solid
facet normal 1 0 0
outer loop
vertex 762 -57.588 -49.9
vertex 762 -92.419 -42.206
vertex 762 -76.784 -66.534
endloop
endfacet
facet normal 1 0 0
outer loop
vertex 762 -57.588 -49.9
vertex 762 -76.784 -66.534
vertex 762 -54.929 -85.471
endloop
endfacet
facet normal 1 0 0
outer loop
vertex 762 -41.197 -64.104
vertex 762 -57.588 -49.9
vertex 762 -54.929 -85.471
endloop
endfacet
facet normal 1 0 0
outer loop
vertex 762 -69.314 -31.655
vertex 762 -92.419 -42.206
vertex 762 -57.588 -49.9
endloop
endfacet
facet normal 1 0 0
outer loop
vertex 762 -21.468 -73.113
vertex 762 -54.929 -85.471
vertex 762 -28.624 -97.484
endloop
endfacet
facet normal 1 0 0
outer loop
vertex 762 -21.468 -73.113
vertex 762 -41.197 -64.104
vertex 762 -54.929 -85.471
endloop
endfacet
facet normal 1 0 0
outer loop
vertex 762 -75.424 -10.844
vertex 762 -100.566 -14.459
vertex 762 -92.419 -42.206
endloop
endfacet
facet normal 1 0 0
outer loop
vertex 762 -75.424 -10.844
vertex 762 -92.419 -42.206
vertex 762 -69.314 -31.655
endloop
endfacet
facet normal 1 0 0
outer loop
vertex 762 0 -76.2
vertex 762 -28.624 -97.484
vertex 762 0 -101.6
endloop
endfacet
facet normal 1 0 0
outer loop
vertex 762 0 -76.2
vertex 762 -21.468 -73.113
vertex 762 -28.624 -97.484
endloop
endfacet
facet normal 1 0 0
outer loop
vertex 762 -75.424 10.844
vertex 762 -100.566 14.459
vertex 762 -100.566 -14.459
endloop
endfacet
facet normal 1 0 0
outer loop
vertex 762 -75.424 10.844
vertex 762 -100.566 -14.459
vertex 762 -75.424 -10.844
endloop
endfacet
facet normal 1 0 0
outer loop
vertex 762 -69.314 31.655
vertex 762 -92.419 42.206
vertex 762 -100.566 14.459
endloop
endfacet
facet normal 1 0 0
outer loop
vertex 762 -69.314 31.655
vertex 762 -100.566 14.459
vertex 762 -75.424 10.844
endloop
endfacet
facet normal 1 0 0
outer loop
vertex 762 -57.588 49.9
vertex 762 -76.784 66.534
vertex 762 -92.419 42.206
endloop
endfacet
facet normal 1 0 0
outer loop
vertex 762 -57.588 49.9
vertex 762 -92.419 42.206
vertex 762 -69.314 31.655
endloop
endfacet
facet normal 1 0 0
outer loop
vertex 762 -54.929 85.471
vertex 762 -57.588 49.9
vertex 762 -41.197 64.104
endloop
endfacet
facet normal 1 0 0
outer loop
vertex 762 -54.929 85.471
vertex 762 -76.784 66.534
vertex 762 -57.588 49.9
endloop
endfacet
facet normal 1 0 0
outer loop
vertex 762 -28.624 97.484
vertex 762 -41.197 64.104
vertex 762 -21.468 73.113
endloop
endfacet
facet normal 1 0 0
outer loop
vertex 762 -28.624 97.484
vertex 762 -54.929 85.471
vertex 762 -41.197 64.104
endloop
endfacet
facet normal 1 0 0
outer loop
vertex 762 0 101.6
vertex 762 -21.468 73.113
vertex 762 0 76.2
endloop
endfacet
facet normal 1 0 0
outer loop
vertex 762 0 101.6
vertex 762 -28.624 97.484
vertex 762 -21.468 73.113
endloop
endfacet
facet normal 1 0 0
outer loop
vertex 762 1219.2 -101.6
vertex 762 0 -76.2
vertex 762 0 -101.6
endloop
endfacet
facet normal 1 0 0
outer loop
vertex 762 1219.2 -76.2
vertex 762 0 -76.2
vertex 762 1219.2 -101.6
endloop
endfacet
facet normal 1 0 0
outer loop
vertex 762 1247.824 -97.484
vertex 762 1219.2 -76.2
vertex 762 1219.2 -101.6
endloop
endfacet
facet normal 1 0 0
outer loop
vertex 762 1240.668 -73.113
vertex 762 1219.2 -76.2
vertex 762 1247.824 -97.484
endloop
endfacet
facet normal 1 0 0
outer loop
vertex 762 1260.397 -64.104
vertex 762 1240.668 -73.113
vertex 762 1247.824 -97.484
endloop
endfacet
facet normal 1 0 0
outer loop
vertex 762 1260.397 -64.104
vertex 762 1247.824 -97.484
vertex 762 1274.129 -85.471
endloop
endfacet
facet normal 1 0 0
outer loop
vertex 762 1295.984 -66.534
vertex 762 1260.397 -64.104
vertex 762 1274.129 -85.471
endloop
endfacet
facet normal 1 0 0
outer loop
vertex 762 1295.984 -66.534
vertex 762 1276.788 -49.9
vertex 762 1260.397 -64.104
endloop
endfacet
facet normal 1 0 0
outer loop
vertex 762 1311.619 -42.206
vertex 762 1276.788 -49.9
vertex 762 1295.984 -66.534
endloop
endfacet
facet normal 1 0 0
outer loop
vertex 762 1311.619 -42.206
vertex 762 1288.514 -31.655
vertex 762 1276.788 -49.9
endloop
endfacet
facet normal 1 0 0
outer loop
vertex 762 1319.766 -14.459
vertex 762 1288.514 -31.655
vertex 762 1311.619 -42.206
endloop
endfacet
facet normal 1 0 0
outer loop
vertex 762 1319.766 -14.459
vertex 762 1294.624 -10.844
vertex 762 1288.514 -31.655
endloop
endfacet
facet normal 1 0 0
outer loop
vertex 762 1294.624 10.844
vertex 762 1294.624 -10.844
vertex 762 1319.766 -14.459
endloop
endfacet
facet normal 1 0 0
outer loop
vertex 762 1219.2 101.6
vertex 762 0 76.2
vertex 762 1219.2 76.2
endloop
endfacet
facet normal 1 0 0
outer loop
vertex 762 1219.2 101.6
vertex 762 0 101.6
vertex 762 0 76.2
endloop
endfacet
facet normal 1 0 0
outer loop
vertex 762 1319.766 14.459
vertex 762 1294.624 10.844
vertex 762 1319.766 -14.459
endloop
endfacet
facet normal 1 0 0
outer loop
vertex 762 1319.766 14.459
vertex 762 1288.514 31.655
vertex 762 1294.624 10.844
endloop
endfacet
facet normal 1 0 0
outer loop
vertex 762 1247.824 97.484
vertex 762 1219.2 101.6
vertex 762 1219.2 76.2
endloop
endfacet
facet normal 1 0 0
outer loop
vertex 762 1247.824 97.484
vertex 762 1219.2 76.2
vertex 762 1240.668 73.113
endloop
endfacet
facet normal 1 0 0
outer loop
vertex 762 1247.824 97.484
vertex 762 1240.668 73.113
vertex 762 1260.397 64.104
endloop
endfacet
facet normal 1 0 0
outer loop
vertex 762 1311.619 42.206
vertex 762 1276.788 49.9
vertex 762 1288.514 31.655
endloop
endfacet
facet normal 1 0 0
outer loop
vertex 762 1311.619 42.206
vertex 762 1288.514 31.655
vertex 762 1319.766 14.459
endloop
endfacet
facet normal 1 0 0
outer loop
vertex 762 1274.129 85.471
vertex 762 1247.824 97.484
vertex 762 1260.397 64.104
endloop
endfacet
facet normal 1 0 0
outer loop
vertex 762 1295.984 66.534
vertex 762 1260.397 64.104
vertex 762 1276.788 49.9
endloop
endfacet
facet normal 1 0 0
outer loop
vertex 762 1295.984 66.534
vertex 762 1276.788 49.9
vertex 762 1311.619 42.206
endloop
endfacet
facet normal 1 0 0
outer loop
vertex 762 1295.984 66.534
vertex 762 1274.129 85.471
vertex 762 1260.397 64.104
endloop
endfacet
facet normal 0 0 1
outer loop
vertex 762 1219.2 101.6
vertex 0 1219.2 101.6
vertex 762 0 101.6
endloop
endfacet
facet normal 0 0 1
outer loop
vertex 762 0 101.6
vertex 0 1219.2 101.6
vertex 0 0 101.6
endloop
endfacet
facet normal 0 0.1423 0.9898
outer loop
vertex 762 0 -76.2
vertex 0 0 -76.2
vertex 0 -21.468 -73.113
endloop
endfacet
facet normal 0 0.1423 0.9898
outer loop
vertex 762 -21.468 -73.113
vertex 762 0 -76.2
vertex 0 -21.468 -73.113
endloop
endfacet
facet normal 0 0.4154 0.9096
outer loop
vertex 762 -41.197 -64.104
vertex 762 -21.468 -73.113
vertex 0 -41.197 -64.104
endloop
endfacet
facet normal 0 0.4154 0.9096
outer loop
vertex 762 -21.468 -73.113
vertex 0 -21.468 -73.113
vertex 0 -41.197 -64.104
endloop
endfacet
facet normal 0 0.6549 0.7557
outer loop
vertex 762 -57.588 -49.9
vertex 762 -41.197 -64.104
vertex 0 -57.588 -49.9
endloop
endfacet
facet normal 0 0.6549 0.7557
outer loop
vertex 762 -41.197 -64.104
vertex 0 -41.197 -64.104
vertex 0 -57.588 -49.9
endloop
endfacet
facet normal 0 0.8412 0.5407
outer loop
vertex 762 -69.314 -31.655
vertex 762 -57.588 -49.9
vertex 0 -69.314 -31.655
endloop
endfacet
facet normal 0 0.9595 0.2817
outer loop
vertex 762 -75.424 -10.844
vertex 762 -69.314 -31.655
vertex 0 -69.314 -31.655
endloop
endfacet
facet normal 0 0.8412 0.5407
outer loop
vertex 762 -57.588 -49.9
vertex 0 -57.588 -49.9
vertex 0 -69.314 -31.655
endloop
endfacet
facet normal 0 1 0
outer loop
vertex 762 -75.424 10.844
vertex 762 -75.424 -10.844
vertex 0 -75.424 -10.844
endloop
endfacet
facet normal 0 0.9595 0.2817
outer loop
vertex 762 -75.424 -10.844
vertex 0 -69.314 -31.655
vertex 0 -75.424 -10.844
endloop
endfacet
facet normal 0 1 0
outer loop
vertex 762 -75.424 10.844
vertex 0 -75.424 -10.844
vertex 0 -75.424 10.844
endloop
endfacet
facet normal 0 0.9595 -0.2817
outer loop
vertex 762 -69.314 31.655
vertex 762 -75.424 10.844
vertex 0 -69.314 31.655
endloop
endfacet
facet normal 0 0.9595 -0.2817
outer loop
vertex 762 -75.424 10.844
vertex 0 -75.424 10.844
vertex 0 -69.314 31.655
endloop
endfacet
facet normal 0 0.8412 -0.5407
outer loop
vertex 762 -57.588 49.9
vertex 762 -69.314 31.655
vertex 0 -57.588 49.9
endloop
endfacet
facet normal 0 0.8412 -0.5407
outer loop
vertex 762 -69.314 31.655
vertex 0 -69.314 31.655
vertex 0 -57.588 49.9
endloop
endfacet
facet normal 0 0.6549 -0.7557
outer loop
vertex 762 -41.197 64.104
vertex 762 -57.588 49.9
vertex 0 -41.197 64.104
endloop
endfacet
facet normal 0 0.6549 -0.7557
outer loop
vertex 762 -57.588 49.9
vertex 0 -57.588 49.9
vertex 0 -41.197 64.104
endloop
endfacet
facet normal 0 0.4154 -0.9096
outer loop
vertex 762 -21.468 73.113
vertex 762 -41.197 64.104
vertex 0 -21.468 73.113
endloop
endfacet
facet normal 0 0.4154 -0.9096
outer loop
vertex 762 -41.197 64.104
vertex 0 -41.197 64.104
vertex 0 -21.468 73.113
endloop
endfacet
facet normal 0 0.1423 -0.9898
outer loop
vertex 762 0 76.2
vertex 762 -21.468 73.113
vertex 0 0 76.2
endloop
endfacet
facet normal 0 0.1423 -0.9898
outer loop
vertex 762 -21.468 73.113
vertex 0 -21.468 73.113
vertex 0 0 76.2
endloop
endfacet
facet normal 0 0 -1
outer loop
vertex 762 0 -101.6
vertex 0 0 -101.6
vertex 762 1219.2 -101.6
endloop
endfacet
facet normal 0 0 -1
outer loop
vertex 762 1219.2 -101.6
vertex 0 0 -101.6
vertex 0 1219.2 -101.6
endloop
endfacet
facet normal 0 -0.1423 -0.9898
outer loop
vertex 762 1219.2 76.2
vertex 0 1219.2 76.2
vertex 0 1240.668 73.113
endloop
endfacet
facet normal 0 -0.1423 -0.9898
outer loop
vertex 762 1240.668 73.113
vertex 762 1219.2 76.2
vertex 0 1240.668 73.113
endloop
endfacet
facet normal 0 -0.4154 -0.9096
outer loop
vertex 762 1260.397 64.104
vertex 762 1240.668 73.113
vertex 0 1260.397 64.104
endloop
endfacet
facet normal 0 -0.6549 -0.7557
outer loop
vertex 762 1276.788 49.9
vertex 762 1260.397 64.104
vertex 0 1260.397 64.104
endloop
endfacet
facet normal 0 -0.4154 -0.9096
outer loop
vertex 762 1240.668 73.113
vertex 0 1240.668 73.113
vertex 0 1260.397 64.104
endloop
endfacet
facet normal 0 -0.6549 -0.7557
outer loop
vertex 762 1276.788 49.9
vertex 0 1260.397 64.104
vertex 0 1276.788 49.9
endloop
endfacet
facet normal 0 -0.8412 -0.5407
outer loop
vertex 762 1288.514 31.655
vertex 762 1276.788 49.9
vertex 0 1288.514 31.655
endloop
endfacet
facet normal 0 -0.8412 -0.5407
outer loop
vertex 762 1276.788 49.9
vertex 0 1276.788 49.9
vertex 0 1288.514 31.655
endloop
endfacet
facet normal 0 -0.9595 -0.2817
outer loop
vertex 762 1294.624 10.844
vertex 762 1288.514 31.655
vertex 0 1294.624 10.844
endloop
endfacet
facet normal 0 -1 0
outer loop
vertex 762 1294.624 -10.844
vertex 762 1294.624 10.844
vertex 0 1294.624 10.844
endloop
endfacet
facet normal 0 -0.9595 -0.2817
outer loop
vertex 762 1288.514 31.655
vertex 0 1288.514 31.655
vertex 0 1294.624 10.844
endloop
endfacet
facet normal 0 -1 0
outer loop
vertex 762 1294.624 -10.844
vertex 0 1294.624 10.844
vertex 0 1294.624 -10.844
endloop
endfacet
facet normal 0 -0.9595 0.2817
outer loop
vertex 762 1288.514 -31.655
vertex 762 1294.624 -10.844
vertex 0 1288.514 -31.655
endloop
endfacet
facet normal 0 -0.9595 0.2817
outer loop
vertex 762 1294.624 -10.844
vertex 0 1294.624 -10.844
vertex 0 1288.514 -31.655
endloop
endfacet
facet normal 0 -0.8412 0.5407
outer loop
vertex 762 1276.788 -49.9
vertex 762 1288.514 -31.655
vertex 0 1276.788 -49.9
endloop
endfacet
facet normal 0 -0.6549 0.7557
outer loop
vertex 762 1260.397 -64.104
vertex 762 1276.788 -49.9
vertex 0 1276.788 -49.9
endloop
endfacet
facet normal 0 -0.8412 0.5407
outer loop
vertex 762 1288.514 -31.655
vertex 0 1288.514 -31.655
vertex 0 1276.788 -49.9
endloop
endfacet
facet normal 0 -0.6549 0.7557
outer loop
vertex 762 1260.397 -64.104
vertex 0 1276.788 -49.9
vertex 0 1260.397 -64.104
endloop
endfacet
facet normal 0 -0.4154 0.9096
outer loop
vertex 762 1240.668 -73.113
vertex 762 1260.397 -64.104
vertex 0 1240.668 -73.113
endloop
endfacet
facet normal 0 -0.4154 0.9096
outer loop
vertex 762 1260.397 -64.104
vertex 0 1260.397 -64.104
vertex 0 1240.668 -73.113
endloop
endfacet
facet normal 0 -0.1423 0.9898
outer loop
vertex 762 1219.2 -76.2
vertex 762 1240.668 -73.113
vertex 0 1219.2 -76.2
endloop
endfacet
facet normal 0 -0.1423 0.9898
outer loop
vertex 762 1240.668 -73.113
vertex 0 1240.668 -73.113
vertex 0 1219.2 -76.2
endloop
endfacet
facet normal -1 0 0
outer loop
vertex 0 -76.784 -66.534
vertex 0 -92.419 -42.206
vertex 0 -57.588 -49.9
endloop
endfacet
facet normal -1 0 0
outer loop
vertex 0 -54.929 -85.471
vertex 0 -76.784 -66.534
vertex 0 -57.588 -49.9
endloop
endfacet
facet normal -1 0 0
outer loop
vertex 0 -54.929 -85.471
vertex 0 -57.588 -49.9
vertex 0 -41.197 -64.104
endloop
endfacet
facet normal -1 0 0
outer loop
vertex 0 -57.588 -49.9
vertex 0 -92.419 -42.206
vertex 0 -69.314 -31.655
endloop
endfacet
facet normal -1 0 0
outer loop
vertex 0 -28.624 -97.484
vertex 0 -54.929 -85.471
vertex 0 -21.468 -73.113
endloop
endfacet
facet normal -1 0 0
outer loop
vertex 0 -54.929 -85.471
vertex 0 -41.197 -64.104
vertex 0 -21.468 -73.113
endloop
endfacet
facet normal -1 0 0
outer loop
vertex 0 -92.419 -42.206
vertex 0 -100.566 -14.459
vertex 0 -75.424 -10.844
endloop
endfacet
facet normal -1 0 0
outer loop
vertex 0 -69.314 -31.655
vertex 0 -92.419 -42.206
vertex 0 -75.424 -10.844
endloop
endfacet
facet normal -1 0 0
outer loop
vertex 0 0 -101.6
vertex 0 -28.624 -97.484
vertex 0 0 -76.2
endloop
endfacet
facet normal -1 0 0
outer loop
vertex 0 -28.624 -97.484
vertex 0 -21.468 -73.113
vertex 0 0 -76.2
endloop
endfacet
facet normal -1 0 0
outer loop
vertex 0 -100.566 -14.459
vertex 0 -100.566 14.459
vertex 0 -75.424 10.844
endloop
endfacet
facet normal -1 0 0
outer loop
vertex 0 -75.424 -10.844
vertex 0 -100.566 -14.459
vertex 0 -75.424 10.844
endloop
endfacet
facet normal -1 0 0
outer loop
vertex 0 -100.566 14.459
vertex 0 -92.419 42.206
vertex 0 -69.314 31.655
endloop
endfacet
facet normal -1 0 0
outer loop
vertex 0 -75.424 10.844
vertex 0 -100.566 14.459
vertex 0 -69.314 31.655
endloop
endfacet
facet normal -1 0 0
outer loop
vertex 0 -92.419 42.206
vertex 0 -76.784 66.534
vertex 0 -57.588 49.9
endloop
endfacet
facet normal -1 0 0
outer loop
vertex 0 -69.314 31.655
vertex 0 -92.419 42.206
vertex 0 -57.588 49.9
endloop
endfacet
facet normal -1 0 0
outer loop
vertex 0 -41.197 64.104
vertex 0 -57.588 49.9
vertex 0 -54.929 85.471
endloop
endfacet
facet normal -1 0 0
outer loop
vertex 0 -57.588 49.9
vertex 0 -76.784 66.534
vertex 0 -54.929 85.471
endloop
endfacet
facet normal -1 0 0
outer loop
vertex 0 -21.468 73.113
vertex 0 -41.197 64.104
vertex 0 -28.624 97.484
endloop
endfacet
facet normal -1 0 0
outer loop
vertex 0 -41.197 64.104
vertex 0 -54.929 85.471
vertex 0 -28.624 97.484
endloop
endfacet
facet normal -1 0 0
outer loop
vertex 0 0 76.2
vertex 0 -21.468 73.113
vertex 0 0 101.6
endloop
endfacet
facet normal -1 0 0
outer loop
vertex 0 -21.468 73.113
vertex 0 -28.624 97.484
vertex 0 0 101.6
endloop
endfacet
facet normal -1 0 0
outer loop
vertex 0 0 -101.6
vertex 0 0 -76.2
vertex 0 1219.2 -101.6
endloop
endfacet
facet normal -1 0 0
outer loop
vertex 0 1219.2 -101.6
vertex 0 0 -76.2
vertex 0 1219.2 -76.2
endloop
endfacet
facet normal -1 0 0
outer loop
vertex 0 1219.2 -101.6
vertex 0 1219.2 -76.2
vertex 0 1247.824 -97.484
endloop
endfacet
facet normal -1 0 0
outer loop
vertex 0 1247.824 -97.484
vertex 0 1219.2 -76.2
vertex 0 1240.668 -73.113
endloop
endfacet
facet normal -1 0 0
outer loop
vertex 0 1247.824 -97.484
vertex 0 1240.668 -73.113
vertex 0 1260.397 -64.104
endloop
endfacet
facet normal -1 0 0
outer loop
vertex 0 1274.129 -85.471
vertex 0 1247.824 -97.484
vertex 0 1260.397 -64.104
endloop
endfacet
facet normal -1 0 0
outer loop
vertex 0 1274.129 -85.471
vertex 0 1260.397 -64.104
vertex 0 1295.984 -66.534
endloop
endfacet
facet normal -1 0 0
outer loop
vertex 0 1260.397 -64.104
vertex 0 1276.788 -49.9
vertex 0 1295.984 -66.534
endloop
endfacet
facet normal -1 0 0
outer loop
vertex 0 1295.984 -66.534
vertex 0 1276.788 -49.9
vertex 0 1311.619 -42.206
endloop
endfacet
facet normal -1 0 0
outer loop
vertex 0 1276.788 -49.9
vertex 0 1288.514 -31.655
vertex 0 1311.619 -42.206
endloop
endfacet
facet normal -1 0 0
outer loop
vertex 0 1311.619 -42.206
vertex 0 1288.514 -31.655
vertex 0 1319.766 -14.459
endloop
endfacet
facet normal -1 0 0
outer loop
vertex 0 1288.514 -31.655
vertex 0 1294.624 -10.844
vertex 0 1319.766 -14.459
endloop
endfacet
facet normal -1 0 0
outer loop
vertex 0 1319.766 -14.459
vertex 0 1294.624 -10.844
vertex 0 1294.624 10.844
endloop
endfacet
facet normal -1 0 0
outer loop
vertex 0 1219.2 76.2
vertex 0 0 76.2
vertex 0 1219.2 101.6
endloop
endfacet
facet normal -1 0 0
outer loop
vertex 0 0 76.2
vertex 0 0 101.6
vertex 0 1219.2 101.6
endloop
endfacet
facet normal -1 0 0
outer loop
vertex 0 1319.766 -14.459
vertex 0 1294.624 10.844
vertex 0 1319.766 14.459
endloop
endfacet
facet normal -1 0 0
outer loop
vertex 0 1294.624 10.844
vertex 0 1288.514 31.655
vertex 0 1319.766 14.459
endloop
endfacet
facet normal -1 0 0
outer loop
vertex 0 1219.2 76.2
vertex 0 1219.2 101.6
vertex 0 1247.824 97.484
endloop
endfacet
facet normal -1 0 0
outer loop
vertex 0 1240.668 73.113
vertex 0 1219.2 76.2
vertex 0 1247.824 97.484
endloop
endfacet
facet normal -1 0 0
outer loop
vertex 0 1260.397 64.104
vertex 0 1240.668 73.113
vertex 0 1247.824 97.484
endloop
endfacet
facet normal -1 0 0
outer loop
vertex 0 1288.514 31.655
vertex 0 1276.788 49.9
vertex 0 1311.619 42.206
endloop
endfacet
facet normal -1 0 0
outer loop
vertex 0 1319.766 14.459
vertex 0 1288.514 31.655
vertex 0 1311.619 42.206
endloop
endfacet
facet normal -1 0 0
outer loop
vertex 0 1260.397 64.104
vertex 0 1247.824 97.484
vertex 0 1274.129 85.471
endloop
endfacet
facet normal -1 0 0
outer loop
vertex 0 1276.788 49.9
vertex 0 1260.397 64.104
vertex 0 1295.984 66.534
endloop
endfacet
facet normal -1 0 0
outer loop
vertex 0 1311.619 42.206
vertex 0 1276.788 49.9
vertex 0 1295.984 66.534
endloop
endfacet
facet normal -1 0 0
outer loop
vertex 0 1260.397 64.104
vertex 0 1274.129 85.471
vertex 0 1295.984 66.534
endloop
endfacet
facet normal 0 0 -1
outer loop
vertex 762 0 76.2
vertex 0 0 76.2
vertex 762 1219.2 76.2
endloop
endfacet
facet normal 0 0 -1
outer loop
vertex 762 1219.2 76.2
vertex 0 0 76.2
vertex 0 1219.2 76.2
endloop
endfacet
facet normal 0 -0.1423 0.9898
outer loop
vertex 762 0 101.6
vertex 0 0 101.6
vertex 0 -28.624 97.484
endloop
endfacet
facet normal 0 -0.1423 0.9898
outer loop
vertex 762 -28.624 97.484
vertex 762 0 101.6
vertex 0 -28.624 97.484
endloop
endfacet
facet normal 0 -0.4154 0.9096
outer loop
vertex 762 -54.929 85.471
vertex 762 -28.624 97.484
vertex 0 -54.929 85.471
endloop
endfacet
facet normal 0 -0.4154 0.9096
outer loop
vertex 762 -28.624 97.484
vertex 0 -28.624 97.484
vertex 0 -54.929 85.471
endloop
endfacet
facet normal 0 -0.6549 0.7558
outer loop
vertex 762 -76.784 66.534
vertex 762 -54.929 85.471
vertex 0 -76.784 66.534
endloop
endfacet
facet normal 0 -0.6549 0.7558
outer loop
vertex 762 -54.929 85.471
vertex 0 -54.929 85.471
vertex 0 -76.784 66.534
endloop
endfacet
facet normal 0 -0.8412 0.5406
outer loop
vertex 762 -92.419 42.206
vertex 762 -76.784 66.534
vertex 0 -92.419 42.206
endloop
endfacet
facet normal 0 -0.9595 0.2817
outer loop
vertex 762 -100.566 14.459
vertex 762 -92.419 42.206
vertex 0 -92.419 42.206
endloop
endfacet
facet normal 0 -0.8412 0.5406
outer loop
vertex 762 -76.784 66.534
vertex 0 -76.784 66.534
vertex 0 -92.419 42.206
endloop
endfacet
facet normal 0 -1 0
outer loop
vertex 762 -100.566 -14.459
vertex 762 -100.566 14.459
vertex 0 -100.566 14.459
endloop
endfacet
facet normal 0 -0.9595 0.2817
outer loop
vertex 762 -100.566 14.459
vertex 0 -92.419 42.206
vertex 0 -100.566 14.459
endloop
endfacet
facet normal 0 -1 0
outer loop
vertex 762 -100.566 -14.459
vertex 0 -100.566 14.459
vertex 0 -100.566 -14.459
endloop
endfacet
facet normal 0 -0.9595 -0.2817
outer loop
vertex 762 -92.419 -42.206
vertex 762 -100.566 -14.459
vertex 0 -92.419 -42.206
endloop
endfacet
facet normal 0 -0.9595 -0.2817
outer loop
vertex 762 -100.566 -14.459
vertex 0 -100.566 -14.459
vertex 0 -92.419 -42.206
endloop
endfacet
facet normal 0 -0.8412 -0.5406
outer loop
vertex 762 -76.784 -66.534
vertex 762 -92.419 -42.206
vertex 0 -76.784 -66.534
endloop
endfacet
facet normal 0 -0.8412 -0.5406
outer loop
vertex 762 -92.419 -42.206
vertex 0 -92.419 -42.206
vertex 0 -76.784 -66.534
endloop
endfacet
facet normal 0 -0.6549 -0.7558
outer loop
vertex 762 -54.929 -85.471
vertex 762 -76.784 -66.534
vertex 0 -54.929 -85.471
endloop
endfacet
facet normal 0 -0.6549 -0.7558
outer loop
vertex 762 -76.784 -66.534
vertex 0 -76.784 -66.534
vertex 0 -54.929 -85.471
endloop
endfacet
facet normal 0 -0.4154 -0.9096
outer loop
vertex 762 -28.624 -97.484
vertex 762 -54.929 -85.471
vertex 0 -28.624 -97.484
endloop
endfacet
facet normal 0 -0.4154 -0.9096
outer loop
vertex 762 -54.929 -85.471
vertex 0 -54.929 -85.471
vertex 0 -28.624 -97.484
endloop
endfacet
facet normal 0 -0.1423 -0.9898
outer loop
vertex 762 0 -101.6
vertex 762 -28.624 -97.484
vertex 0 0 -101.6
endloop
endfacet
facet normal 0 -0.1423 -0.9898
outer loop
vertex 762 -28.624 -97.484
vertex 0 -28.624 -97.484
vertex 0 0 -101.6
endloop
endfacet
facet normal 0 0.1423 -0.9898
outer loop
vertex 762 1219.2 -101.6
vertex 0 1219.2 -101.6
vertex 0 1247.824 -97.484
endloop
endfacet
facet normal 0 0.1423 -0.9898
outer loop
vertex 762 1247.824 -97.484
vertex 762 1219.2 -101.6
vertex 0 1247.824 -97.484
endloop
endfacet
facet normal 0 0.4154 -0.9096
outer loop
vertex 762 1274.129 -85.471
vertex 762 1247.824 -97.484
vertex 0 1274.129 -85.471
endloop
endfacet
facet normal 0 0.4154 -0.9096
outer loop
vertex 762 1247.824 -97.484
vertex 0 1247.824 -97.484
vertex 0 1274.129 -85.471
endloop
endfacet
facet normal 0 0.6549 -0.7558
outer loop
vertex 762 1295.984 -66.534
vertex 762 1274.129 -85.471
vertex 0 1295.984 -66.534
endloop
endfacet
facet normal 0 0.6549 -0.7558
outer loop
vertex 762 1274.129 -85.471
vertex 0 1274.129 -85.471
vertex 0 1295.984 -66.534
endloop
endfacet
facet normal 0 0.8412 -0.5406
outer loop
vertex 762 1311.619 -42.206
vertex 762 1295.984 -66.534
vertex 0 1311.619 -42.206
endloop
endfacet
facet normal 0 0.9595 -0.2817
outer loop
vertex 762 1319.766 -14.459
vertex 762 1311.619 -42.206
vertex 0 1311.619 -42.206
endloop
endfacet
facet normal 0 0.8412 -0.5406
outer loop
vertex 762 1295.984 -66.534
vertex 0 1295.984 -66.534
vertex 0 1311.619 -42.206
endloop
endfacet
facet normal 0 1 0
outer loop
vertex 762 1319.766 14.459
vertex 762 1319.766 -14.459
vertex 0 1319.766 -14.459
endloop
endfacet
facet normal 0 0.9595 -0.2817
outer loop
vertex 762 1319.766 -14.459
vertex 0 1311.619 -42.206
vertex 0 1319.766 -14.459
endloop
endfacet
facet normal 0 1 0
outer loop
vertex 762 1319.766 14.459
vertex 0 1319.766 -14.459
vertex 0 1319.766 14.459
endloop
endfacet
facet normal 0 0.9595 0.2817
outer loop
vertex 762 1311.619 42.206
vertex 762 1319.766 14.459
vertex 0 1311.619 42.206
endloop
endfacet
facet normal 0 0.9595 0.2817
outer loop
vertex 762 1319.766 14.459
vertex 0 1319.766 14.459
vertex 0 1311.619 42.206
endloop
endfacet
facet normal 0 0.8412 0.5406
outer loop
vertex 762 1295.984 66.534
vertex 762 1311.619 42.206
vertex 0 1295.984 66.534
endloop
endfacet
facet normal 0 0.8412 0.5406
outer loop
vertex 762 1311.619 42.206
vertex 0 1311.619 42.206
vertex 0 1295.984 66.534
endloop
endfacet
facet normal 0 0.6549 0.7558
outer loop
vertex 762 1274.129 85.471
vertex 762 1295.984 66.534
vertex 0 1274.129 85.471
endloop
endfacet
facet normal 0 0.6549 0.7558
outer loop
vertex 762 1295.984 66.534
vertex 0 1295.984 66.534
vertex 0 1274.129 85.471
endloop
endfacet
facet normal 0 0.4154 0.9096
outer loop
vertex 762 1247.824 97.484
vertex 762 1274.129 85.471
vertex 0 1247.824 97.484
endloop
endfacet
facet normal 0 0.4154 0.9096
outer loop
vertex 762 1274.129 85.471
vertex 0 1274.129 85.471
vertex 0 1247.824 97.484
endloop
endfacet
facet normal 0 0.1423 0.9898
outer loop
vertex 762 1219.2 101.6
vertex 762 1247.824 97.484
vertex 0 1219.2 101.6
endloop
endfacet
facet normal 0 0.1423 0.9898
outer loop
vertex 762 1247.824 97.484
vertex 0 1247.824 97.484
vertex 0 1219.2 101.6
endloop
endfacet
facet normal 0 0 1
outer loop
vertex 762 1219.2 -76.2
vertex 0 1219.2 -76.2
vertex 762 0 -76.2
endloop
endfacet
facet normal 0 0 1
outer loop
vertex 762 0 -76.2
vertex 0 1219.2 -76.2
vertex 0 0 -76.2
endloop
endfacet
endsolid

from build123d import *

# Parameters (mm, degrees)
F1_DEPTH = 762


with BuildPart() as f1:
    # F0 (on Right) → F1 (new body)
    with BuildSketch(Plane.YZ):
        with BuildLine():
            ThreePointArc((0, 76.2), (-76.2, 0), (0, -76.2))
            Line((0, -76.2), (1219.2, -76.2))
            ThreePointArc((1219.2, -76.2), (1295.4, 0), (1219.2, 76.2))
            Line((1219.2, 76.2), (0, 76.2))
        make_face()
        with BuildLine():
            ThreePointArc((0, 101.6), (-101.6, 0), (0, -101.6))
            Line((0, -101.6), (1219.2, -101.6))
            ThreePointArc((1219.2, -101.6), (1320.8, 0), (1219.2, 101.6))
            Line((1219.2, 101.6), (0, 101.6))
        make_face()
        with BuildLine():
            Line((1219.2, -76.2), (0, -76.2))
            ThreePointArc((0, -76.2), (-76.2, 0), (0, 76.2))
            Line((0, 76.2), (1219.2, 76.2))
            ThreePointArc((1219.2, 76.2), (1295.4, 0), (1219.2, -76.2))
        make_face(mode=Mode.SUBTRACT)
    extrude(amount=F1_DEPTH)


solid = f1.part
